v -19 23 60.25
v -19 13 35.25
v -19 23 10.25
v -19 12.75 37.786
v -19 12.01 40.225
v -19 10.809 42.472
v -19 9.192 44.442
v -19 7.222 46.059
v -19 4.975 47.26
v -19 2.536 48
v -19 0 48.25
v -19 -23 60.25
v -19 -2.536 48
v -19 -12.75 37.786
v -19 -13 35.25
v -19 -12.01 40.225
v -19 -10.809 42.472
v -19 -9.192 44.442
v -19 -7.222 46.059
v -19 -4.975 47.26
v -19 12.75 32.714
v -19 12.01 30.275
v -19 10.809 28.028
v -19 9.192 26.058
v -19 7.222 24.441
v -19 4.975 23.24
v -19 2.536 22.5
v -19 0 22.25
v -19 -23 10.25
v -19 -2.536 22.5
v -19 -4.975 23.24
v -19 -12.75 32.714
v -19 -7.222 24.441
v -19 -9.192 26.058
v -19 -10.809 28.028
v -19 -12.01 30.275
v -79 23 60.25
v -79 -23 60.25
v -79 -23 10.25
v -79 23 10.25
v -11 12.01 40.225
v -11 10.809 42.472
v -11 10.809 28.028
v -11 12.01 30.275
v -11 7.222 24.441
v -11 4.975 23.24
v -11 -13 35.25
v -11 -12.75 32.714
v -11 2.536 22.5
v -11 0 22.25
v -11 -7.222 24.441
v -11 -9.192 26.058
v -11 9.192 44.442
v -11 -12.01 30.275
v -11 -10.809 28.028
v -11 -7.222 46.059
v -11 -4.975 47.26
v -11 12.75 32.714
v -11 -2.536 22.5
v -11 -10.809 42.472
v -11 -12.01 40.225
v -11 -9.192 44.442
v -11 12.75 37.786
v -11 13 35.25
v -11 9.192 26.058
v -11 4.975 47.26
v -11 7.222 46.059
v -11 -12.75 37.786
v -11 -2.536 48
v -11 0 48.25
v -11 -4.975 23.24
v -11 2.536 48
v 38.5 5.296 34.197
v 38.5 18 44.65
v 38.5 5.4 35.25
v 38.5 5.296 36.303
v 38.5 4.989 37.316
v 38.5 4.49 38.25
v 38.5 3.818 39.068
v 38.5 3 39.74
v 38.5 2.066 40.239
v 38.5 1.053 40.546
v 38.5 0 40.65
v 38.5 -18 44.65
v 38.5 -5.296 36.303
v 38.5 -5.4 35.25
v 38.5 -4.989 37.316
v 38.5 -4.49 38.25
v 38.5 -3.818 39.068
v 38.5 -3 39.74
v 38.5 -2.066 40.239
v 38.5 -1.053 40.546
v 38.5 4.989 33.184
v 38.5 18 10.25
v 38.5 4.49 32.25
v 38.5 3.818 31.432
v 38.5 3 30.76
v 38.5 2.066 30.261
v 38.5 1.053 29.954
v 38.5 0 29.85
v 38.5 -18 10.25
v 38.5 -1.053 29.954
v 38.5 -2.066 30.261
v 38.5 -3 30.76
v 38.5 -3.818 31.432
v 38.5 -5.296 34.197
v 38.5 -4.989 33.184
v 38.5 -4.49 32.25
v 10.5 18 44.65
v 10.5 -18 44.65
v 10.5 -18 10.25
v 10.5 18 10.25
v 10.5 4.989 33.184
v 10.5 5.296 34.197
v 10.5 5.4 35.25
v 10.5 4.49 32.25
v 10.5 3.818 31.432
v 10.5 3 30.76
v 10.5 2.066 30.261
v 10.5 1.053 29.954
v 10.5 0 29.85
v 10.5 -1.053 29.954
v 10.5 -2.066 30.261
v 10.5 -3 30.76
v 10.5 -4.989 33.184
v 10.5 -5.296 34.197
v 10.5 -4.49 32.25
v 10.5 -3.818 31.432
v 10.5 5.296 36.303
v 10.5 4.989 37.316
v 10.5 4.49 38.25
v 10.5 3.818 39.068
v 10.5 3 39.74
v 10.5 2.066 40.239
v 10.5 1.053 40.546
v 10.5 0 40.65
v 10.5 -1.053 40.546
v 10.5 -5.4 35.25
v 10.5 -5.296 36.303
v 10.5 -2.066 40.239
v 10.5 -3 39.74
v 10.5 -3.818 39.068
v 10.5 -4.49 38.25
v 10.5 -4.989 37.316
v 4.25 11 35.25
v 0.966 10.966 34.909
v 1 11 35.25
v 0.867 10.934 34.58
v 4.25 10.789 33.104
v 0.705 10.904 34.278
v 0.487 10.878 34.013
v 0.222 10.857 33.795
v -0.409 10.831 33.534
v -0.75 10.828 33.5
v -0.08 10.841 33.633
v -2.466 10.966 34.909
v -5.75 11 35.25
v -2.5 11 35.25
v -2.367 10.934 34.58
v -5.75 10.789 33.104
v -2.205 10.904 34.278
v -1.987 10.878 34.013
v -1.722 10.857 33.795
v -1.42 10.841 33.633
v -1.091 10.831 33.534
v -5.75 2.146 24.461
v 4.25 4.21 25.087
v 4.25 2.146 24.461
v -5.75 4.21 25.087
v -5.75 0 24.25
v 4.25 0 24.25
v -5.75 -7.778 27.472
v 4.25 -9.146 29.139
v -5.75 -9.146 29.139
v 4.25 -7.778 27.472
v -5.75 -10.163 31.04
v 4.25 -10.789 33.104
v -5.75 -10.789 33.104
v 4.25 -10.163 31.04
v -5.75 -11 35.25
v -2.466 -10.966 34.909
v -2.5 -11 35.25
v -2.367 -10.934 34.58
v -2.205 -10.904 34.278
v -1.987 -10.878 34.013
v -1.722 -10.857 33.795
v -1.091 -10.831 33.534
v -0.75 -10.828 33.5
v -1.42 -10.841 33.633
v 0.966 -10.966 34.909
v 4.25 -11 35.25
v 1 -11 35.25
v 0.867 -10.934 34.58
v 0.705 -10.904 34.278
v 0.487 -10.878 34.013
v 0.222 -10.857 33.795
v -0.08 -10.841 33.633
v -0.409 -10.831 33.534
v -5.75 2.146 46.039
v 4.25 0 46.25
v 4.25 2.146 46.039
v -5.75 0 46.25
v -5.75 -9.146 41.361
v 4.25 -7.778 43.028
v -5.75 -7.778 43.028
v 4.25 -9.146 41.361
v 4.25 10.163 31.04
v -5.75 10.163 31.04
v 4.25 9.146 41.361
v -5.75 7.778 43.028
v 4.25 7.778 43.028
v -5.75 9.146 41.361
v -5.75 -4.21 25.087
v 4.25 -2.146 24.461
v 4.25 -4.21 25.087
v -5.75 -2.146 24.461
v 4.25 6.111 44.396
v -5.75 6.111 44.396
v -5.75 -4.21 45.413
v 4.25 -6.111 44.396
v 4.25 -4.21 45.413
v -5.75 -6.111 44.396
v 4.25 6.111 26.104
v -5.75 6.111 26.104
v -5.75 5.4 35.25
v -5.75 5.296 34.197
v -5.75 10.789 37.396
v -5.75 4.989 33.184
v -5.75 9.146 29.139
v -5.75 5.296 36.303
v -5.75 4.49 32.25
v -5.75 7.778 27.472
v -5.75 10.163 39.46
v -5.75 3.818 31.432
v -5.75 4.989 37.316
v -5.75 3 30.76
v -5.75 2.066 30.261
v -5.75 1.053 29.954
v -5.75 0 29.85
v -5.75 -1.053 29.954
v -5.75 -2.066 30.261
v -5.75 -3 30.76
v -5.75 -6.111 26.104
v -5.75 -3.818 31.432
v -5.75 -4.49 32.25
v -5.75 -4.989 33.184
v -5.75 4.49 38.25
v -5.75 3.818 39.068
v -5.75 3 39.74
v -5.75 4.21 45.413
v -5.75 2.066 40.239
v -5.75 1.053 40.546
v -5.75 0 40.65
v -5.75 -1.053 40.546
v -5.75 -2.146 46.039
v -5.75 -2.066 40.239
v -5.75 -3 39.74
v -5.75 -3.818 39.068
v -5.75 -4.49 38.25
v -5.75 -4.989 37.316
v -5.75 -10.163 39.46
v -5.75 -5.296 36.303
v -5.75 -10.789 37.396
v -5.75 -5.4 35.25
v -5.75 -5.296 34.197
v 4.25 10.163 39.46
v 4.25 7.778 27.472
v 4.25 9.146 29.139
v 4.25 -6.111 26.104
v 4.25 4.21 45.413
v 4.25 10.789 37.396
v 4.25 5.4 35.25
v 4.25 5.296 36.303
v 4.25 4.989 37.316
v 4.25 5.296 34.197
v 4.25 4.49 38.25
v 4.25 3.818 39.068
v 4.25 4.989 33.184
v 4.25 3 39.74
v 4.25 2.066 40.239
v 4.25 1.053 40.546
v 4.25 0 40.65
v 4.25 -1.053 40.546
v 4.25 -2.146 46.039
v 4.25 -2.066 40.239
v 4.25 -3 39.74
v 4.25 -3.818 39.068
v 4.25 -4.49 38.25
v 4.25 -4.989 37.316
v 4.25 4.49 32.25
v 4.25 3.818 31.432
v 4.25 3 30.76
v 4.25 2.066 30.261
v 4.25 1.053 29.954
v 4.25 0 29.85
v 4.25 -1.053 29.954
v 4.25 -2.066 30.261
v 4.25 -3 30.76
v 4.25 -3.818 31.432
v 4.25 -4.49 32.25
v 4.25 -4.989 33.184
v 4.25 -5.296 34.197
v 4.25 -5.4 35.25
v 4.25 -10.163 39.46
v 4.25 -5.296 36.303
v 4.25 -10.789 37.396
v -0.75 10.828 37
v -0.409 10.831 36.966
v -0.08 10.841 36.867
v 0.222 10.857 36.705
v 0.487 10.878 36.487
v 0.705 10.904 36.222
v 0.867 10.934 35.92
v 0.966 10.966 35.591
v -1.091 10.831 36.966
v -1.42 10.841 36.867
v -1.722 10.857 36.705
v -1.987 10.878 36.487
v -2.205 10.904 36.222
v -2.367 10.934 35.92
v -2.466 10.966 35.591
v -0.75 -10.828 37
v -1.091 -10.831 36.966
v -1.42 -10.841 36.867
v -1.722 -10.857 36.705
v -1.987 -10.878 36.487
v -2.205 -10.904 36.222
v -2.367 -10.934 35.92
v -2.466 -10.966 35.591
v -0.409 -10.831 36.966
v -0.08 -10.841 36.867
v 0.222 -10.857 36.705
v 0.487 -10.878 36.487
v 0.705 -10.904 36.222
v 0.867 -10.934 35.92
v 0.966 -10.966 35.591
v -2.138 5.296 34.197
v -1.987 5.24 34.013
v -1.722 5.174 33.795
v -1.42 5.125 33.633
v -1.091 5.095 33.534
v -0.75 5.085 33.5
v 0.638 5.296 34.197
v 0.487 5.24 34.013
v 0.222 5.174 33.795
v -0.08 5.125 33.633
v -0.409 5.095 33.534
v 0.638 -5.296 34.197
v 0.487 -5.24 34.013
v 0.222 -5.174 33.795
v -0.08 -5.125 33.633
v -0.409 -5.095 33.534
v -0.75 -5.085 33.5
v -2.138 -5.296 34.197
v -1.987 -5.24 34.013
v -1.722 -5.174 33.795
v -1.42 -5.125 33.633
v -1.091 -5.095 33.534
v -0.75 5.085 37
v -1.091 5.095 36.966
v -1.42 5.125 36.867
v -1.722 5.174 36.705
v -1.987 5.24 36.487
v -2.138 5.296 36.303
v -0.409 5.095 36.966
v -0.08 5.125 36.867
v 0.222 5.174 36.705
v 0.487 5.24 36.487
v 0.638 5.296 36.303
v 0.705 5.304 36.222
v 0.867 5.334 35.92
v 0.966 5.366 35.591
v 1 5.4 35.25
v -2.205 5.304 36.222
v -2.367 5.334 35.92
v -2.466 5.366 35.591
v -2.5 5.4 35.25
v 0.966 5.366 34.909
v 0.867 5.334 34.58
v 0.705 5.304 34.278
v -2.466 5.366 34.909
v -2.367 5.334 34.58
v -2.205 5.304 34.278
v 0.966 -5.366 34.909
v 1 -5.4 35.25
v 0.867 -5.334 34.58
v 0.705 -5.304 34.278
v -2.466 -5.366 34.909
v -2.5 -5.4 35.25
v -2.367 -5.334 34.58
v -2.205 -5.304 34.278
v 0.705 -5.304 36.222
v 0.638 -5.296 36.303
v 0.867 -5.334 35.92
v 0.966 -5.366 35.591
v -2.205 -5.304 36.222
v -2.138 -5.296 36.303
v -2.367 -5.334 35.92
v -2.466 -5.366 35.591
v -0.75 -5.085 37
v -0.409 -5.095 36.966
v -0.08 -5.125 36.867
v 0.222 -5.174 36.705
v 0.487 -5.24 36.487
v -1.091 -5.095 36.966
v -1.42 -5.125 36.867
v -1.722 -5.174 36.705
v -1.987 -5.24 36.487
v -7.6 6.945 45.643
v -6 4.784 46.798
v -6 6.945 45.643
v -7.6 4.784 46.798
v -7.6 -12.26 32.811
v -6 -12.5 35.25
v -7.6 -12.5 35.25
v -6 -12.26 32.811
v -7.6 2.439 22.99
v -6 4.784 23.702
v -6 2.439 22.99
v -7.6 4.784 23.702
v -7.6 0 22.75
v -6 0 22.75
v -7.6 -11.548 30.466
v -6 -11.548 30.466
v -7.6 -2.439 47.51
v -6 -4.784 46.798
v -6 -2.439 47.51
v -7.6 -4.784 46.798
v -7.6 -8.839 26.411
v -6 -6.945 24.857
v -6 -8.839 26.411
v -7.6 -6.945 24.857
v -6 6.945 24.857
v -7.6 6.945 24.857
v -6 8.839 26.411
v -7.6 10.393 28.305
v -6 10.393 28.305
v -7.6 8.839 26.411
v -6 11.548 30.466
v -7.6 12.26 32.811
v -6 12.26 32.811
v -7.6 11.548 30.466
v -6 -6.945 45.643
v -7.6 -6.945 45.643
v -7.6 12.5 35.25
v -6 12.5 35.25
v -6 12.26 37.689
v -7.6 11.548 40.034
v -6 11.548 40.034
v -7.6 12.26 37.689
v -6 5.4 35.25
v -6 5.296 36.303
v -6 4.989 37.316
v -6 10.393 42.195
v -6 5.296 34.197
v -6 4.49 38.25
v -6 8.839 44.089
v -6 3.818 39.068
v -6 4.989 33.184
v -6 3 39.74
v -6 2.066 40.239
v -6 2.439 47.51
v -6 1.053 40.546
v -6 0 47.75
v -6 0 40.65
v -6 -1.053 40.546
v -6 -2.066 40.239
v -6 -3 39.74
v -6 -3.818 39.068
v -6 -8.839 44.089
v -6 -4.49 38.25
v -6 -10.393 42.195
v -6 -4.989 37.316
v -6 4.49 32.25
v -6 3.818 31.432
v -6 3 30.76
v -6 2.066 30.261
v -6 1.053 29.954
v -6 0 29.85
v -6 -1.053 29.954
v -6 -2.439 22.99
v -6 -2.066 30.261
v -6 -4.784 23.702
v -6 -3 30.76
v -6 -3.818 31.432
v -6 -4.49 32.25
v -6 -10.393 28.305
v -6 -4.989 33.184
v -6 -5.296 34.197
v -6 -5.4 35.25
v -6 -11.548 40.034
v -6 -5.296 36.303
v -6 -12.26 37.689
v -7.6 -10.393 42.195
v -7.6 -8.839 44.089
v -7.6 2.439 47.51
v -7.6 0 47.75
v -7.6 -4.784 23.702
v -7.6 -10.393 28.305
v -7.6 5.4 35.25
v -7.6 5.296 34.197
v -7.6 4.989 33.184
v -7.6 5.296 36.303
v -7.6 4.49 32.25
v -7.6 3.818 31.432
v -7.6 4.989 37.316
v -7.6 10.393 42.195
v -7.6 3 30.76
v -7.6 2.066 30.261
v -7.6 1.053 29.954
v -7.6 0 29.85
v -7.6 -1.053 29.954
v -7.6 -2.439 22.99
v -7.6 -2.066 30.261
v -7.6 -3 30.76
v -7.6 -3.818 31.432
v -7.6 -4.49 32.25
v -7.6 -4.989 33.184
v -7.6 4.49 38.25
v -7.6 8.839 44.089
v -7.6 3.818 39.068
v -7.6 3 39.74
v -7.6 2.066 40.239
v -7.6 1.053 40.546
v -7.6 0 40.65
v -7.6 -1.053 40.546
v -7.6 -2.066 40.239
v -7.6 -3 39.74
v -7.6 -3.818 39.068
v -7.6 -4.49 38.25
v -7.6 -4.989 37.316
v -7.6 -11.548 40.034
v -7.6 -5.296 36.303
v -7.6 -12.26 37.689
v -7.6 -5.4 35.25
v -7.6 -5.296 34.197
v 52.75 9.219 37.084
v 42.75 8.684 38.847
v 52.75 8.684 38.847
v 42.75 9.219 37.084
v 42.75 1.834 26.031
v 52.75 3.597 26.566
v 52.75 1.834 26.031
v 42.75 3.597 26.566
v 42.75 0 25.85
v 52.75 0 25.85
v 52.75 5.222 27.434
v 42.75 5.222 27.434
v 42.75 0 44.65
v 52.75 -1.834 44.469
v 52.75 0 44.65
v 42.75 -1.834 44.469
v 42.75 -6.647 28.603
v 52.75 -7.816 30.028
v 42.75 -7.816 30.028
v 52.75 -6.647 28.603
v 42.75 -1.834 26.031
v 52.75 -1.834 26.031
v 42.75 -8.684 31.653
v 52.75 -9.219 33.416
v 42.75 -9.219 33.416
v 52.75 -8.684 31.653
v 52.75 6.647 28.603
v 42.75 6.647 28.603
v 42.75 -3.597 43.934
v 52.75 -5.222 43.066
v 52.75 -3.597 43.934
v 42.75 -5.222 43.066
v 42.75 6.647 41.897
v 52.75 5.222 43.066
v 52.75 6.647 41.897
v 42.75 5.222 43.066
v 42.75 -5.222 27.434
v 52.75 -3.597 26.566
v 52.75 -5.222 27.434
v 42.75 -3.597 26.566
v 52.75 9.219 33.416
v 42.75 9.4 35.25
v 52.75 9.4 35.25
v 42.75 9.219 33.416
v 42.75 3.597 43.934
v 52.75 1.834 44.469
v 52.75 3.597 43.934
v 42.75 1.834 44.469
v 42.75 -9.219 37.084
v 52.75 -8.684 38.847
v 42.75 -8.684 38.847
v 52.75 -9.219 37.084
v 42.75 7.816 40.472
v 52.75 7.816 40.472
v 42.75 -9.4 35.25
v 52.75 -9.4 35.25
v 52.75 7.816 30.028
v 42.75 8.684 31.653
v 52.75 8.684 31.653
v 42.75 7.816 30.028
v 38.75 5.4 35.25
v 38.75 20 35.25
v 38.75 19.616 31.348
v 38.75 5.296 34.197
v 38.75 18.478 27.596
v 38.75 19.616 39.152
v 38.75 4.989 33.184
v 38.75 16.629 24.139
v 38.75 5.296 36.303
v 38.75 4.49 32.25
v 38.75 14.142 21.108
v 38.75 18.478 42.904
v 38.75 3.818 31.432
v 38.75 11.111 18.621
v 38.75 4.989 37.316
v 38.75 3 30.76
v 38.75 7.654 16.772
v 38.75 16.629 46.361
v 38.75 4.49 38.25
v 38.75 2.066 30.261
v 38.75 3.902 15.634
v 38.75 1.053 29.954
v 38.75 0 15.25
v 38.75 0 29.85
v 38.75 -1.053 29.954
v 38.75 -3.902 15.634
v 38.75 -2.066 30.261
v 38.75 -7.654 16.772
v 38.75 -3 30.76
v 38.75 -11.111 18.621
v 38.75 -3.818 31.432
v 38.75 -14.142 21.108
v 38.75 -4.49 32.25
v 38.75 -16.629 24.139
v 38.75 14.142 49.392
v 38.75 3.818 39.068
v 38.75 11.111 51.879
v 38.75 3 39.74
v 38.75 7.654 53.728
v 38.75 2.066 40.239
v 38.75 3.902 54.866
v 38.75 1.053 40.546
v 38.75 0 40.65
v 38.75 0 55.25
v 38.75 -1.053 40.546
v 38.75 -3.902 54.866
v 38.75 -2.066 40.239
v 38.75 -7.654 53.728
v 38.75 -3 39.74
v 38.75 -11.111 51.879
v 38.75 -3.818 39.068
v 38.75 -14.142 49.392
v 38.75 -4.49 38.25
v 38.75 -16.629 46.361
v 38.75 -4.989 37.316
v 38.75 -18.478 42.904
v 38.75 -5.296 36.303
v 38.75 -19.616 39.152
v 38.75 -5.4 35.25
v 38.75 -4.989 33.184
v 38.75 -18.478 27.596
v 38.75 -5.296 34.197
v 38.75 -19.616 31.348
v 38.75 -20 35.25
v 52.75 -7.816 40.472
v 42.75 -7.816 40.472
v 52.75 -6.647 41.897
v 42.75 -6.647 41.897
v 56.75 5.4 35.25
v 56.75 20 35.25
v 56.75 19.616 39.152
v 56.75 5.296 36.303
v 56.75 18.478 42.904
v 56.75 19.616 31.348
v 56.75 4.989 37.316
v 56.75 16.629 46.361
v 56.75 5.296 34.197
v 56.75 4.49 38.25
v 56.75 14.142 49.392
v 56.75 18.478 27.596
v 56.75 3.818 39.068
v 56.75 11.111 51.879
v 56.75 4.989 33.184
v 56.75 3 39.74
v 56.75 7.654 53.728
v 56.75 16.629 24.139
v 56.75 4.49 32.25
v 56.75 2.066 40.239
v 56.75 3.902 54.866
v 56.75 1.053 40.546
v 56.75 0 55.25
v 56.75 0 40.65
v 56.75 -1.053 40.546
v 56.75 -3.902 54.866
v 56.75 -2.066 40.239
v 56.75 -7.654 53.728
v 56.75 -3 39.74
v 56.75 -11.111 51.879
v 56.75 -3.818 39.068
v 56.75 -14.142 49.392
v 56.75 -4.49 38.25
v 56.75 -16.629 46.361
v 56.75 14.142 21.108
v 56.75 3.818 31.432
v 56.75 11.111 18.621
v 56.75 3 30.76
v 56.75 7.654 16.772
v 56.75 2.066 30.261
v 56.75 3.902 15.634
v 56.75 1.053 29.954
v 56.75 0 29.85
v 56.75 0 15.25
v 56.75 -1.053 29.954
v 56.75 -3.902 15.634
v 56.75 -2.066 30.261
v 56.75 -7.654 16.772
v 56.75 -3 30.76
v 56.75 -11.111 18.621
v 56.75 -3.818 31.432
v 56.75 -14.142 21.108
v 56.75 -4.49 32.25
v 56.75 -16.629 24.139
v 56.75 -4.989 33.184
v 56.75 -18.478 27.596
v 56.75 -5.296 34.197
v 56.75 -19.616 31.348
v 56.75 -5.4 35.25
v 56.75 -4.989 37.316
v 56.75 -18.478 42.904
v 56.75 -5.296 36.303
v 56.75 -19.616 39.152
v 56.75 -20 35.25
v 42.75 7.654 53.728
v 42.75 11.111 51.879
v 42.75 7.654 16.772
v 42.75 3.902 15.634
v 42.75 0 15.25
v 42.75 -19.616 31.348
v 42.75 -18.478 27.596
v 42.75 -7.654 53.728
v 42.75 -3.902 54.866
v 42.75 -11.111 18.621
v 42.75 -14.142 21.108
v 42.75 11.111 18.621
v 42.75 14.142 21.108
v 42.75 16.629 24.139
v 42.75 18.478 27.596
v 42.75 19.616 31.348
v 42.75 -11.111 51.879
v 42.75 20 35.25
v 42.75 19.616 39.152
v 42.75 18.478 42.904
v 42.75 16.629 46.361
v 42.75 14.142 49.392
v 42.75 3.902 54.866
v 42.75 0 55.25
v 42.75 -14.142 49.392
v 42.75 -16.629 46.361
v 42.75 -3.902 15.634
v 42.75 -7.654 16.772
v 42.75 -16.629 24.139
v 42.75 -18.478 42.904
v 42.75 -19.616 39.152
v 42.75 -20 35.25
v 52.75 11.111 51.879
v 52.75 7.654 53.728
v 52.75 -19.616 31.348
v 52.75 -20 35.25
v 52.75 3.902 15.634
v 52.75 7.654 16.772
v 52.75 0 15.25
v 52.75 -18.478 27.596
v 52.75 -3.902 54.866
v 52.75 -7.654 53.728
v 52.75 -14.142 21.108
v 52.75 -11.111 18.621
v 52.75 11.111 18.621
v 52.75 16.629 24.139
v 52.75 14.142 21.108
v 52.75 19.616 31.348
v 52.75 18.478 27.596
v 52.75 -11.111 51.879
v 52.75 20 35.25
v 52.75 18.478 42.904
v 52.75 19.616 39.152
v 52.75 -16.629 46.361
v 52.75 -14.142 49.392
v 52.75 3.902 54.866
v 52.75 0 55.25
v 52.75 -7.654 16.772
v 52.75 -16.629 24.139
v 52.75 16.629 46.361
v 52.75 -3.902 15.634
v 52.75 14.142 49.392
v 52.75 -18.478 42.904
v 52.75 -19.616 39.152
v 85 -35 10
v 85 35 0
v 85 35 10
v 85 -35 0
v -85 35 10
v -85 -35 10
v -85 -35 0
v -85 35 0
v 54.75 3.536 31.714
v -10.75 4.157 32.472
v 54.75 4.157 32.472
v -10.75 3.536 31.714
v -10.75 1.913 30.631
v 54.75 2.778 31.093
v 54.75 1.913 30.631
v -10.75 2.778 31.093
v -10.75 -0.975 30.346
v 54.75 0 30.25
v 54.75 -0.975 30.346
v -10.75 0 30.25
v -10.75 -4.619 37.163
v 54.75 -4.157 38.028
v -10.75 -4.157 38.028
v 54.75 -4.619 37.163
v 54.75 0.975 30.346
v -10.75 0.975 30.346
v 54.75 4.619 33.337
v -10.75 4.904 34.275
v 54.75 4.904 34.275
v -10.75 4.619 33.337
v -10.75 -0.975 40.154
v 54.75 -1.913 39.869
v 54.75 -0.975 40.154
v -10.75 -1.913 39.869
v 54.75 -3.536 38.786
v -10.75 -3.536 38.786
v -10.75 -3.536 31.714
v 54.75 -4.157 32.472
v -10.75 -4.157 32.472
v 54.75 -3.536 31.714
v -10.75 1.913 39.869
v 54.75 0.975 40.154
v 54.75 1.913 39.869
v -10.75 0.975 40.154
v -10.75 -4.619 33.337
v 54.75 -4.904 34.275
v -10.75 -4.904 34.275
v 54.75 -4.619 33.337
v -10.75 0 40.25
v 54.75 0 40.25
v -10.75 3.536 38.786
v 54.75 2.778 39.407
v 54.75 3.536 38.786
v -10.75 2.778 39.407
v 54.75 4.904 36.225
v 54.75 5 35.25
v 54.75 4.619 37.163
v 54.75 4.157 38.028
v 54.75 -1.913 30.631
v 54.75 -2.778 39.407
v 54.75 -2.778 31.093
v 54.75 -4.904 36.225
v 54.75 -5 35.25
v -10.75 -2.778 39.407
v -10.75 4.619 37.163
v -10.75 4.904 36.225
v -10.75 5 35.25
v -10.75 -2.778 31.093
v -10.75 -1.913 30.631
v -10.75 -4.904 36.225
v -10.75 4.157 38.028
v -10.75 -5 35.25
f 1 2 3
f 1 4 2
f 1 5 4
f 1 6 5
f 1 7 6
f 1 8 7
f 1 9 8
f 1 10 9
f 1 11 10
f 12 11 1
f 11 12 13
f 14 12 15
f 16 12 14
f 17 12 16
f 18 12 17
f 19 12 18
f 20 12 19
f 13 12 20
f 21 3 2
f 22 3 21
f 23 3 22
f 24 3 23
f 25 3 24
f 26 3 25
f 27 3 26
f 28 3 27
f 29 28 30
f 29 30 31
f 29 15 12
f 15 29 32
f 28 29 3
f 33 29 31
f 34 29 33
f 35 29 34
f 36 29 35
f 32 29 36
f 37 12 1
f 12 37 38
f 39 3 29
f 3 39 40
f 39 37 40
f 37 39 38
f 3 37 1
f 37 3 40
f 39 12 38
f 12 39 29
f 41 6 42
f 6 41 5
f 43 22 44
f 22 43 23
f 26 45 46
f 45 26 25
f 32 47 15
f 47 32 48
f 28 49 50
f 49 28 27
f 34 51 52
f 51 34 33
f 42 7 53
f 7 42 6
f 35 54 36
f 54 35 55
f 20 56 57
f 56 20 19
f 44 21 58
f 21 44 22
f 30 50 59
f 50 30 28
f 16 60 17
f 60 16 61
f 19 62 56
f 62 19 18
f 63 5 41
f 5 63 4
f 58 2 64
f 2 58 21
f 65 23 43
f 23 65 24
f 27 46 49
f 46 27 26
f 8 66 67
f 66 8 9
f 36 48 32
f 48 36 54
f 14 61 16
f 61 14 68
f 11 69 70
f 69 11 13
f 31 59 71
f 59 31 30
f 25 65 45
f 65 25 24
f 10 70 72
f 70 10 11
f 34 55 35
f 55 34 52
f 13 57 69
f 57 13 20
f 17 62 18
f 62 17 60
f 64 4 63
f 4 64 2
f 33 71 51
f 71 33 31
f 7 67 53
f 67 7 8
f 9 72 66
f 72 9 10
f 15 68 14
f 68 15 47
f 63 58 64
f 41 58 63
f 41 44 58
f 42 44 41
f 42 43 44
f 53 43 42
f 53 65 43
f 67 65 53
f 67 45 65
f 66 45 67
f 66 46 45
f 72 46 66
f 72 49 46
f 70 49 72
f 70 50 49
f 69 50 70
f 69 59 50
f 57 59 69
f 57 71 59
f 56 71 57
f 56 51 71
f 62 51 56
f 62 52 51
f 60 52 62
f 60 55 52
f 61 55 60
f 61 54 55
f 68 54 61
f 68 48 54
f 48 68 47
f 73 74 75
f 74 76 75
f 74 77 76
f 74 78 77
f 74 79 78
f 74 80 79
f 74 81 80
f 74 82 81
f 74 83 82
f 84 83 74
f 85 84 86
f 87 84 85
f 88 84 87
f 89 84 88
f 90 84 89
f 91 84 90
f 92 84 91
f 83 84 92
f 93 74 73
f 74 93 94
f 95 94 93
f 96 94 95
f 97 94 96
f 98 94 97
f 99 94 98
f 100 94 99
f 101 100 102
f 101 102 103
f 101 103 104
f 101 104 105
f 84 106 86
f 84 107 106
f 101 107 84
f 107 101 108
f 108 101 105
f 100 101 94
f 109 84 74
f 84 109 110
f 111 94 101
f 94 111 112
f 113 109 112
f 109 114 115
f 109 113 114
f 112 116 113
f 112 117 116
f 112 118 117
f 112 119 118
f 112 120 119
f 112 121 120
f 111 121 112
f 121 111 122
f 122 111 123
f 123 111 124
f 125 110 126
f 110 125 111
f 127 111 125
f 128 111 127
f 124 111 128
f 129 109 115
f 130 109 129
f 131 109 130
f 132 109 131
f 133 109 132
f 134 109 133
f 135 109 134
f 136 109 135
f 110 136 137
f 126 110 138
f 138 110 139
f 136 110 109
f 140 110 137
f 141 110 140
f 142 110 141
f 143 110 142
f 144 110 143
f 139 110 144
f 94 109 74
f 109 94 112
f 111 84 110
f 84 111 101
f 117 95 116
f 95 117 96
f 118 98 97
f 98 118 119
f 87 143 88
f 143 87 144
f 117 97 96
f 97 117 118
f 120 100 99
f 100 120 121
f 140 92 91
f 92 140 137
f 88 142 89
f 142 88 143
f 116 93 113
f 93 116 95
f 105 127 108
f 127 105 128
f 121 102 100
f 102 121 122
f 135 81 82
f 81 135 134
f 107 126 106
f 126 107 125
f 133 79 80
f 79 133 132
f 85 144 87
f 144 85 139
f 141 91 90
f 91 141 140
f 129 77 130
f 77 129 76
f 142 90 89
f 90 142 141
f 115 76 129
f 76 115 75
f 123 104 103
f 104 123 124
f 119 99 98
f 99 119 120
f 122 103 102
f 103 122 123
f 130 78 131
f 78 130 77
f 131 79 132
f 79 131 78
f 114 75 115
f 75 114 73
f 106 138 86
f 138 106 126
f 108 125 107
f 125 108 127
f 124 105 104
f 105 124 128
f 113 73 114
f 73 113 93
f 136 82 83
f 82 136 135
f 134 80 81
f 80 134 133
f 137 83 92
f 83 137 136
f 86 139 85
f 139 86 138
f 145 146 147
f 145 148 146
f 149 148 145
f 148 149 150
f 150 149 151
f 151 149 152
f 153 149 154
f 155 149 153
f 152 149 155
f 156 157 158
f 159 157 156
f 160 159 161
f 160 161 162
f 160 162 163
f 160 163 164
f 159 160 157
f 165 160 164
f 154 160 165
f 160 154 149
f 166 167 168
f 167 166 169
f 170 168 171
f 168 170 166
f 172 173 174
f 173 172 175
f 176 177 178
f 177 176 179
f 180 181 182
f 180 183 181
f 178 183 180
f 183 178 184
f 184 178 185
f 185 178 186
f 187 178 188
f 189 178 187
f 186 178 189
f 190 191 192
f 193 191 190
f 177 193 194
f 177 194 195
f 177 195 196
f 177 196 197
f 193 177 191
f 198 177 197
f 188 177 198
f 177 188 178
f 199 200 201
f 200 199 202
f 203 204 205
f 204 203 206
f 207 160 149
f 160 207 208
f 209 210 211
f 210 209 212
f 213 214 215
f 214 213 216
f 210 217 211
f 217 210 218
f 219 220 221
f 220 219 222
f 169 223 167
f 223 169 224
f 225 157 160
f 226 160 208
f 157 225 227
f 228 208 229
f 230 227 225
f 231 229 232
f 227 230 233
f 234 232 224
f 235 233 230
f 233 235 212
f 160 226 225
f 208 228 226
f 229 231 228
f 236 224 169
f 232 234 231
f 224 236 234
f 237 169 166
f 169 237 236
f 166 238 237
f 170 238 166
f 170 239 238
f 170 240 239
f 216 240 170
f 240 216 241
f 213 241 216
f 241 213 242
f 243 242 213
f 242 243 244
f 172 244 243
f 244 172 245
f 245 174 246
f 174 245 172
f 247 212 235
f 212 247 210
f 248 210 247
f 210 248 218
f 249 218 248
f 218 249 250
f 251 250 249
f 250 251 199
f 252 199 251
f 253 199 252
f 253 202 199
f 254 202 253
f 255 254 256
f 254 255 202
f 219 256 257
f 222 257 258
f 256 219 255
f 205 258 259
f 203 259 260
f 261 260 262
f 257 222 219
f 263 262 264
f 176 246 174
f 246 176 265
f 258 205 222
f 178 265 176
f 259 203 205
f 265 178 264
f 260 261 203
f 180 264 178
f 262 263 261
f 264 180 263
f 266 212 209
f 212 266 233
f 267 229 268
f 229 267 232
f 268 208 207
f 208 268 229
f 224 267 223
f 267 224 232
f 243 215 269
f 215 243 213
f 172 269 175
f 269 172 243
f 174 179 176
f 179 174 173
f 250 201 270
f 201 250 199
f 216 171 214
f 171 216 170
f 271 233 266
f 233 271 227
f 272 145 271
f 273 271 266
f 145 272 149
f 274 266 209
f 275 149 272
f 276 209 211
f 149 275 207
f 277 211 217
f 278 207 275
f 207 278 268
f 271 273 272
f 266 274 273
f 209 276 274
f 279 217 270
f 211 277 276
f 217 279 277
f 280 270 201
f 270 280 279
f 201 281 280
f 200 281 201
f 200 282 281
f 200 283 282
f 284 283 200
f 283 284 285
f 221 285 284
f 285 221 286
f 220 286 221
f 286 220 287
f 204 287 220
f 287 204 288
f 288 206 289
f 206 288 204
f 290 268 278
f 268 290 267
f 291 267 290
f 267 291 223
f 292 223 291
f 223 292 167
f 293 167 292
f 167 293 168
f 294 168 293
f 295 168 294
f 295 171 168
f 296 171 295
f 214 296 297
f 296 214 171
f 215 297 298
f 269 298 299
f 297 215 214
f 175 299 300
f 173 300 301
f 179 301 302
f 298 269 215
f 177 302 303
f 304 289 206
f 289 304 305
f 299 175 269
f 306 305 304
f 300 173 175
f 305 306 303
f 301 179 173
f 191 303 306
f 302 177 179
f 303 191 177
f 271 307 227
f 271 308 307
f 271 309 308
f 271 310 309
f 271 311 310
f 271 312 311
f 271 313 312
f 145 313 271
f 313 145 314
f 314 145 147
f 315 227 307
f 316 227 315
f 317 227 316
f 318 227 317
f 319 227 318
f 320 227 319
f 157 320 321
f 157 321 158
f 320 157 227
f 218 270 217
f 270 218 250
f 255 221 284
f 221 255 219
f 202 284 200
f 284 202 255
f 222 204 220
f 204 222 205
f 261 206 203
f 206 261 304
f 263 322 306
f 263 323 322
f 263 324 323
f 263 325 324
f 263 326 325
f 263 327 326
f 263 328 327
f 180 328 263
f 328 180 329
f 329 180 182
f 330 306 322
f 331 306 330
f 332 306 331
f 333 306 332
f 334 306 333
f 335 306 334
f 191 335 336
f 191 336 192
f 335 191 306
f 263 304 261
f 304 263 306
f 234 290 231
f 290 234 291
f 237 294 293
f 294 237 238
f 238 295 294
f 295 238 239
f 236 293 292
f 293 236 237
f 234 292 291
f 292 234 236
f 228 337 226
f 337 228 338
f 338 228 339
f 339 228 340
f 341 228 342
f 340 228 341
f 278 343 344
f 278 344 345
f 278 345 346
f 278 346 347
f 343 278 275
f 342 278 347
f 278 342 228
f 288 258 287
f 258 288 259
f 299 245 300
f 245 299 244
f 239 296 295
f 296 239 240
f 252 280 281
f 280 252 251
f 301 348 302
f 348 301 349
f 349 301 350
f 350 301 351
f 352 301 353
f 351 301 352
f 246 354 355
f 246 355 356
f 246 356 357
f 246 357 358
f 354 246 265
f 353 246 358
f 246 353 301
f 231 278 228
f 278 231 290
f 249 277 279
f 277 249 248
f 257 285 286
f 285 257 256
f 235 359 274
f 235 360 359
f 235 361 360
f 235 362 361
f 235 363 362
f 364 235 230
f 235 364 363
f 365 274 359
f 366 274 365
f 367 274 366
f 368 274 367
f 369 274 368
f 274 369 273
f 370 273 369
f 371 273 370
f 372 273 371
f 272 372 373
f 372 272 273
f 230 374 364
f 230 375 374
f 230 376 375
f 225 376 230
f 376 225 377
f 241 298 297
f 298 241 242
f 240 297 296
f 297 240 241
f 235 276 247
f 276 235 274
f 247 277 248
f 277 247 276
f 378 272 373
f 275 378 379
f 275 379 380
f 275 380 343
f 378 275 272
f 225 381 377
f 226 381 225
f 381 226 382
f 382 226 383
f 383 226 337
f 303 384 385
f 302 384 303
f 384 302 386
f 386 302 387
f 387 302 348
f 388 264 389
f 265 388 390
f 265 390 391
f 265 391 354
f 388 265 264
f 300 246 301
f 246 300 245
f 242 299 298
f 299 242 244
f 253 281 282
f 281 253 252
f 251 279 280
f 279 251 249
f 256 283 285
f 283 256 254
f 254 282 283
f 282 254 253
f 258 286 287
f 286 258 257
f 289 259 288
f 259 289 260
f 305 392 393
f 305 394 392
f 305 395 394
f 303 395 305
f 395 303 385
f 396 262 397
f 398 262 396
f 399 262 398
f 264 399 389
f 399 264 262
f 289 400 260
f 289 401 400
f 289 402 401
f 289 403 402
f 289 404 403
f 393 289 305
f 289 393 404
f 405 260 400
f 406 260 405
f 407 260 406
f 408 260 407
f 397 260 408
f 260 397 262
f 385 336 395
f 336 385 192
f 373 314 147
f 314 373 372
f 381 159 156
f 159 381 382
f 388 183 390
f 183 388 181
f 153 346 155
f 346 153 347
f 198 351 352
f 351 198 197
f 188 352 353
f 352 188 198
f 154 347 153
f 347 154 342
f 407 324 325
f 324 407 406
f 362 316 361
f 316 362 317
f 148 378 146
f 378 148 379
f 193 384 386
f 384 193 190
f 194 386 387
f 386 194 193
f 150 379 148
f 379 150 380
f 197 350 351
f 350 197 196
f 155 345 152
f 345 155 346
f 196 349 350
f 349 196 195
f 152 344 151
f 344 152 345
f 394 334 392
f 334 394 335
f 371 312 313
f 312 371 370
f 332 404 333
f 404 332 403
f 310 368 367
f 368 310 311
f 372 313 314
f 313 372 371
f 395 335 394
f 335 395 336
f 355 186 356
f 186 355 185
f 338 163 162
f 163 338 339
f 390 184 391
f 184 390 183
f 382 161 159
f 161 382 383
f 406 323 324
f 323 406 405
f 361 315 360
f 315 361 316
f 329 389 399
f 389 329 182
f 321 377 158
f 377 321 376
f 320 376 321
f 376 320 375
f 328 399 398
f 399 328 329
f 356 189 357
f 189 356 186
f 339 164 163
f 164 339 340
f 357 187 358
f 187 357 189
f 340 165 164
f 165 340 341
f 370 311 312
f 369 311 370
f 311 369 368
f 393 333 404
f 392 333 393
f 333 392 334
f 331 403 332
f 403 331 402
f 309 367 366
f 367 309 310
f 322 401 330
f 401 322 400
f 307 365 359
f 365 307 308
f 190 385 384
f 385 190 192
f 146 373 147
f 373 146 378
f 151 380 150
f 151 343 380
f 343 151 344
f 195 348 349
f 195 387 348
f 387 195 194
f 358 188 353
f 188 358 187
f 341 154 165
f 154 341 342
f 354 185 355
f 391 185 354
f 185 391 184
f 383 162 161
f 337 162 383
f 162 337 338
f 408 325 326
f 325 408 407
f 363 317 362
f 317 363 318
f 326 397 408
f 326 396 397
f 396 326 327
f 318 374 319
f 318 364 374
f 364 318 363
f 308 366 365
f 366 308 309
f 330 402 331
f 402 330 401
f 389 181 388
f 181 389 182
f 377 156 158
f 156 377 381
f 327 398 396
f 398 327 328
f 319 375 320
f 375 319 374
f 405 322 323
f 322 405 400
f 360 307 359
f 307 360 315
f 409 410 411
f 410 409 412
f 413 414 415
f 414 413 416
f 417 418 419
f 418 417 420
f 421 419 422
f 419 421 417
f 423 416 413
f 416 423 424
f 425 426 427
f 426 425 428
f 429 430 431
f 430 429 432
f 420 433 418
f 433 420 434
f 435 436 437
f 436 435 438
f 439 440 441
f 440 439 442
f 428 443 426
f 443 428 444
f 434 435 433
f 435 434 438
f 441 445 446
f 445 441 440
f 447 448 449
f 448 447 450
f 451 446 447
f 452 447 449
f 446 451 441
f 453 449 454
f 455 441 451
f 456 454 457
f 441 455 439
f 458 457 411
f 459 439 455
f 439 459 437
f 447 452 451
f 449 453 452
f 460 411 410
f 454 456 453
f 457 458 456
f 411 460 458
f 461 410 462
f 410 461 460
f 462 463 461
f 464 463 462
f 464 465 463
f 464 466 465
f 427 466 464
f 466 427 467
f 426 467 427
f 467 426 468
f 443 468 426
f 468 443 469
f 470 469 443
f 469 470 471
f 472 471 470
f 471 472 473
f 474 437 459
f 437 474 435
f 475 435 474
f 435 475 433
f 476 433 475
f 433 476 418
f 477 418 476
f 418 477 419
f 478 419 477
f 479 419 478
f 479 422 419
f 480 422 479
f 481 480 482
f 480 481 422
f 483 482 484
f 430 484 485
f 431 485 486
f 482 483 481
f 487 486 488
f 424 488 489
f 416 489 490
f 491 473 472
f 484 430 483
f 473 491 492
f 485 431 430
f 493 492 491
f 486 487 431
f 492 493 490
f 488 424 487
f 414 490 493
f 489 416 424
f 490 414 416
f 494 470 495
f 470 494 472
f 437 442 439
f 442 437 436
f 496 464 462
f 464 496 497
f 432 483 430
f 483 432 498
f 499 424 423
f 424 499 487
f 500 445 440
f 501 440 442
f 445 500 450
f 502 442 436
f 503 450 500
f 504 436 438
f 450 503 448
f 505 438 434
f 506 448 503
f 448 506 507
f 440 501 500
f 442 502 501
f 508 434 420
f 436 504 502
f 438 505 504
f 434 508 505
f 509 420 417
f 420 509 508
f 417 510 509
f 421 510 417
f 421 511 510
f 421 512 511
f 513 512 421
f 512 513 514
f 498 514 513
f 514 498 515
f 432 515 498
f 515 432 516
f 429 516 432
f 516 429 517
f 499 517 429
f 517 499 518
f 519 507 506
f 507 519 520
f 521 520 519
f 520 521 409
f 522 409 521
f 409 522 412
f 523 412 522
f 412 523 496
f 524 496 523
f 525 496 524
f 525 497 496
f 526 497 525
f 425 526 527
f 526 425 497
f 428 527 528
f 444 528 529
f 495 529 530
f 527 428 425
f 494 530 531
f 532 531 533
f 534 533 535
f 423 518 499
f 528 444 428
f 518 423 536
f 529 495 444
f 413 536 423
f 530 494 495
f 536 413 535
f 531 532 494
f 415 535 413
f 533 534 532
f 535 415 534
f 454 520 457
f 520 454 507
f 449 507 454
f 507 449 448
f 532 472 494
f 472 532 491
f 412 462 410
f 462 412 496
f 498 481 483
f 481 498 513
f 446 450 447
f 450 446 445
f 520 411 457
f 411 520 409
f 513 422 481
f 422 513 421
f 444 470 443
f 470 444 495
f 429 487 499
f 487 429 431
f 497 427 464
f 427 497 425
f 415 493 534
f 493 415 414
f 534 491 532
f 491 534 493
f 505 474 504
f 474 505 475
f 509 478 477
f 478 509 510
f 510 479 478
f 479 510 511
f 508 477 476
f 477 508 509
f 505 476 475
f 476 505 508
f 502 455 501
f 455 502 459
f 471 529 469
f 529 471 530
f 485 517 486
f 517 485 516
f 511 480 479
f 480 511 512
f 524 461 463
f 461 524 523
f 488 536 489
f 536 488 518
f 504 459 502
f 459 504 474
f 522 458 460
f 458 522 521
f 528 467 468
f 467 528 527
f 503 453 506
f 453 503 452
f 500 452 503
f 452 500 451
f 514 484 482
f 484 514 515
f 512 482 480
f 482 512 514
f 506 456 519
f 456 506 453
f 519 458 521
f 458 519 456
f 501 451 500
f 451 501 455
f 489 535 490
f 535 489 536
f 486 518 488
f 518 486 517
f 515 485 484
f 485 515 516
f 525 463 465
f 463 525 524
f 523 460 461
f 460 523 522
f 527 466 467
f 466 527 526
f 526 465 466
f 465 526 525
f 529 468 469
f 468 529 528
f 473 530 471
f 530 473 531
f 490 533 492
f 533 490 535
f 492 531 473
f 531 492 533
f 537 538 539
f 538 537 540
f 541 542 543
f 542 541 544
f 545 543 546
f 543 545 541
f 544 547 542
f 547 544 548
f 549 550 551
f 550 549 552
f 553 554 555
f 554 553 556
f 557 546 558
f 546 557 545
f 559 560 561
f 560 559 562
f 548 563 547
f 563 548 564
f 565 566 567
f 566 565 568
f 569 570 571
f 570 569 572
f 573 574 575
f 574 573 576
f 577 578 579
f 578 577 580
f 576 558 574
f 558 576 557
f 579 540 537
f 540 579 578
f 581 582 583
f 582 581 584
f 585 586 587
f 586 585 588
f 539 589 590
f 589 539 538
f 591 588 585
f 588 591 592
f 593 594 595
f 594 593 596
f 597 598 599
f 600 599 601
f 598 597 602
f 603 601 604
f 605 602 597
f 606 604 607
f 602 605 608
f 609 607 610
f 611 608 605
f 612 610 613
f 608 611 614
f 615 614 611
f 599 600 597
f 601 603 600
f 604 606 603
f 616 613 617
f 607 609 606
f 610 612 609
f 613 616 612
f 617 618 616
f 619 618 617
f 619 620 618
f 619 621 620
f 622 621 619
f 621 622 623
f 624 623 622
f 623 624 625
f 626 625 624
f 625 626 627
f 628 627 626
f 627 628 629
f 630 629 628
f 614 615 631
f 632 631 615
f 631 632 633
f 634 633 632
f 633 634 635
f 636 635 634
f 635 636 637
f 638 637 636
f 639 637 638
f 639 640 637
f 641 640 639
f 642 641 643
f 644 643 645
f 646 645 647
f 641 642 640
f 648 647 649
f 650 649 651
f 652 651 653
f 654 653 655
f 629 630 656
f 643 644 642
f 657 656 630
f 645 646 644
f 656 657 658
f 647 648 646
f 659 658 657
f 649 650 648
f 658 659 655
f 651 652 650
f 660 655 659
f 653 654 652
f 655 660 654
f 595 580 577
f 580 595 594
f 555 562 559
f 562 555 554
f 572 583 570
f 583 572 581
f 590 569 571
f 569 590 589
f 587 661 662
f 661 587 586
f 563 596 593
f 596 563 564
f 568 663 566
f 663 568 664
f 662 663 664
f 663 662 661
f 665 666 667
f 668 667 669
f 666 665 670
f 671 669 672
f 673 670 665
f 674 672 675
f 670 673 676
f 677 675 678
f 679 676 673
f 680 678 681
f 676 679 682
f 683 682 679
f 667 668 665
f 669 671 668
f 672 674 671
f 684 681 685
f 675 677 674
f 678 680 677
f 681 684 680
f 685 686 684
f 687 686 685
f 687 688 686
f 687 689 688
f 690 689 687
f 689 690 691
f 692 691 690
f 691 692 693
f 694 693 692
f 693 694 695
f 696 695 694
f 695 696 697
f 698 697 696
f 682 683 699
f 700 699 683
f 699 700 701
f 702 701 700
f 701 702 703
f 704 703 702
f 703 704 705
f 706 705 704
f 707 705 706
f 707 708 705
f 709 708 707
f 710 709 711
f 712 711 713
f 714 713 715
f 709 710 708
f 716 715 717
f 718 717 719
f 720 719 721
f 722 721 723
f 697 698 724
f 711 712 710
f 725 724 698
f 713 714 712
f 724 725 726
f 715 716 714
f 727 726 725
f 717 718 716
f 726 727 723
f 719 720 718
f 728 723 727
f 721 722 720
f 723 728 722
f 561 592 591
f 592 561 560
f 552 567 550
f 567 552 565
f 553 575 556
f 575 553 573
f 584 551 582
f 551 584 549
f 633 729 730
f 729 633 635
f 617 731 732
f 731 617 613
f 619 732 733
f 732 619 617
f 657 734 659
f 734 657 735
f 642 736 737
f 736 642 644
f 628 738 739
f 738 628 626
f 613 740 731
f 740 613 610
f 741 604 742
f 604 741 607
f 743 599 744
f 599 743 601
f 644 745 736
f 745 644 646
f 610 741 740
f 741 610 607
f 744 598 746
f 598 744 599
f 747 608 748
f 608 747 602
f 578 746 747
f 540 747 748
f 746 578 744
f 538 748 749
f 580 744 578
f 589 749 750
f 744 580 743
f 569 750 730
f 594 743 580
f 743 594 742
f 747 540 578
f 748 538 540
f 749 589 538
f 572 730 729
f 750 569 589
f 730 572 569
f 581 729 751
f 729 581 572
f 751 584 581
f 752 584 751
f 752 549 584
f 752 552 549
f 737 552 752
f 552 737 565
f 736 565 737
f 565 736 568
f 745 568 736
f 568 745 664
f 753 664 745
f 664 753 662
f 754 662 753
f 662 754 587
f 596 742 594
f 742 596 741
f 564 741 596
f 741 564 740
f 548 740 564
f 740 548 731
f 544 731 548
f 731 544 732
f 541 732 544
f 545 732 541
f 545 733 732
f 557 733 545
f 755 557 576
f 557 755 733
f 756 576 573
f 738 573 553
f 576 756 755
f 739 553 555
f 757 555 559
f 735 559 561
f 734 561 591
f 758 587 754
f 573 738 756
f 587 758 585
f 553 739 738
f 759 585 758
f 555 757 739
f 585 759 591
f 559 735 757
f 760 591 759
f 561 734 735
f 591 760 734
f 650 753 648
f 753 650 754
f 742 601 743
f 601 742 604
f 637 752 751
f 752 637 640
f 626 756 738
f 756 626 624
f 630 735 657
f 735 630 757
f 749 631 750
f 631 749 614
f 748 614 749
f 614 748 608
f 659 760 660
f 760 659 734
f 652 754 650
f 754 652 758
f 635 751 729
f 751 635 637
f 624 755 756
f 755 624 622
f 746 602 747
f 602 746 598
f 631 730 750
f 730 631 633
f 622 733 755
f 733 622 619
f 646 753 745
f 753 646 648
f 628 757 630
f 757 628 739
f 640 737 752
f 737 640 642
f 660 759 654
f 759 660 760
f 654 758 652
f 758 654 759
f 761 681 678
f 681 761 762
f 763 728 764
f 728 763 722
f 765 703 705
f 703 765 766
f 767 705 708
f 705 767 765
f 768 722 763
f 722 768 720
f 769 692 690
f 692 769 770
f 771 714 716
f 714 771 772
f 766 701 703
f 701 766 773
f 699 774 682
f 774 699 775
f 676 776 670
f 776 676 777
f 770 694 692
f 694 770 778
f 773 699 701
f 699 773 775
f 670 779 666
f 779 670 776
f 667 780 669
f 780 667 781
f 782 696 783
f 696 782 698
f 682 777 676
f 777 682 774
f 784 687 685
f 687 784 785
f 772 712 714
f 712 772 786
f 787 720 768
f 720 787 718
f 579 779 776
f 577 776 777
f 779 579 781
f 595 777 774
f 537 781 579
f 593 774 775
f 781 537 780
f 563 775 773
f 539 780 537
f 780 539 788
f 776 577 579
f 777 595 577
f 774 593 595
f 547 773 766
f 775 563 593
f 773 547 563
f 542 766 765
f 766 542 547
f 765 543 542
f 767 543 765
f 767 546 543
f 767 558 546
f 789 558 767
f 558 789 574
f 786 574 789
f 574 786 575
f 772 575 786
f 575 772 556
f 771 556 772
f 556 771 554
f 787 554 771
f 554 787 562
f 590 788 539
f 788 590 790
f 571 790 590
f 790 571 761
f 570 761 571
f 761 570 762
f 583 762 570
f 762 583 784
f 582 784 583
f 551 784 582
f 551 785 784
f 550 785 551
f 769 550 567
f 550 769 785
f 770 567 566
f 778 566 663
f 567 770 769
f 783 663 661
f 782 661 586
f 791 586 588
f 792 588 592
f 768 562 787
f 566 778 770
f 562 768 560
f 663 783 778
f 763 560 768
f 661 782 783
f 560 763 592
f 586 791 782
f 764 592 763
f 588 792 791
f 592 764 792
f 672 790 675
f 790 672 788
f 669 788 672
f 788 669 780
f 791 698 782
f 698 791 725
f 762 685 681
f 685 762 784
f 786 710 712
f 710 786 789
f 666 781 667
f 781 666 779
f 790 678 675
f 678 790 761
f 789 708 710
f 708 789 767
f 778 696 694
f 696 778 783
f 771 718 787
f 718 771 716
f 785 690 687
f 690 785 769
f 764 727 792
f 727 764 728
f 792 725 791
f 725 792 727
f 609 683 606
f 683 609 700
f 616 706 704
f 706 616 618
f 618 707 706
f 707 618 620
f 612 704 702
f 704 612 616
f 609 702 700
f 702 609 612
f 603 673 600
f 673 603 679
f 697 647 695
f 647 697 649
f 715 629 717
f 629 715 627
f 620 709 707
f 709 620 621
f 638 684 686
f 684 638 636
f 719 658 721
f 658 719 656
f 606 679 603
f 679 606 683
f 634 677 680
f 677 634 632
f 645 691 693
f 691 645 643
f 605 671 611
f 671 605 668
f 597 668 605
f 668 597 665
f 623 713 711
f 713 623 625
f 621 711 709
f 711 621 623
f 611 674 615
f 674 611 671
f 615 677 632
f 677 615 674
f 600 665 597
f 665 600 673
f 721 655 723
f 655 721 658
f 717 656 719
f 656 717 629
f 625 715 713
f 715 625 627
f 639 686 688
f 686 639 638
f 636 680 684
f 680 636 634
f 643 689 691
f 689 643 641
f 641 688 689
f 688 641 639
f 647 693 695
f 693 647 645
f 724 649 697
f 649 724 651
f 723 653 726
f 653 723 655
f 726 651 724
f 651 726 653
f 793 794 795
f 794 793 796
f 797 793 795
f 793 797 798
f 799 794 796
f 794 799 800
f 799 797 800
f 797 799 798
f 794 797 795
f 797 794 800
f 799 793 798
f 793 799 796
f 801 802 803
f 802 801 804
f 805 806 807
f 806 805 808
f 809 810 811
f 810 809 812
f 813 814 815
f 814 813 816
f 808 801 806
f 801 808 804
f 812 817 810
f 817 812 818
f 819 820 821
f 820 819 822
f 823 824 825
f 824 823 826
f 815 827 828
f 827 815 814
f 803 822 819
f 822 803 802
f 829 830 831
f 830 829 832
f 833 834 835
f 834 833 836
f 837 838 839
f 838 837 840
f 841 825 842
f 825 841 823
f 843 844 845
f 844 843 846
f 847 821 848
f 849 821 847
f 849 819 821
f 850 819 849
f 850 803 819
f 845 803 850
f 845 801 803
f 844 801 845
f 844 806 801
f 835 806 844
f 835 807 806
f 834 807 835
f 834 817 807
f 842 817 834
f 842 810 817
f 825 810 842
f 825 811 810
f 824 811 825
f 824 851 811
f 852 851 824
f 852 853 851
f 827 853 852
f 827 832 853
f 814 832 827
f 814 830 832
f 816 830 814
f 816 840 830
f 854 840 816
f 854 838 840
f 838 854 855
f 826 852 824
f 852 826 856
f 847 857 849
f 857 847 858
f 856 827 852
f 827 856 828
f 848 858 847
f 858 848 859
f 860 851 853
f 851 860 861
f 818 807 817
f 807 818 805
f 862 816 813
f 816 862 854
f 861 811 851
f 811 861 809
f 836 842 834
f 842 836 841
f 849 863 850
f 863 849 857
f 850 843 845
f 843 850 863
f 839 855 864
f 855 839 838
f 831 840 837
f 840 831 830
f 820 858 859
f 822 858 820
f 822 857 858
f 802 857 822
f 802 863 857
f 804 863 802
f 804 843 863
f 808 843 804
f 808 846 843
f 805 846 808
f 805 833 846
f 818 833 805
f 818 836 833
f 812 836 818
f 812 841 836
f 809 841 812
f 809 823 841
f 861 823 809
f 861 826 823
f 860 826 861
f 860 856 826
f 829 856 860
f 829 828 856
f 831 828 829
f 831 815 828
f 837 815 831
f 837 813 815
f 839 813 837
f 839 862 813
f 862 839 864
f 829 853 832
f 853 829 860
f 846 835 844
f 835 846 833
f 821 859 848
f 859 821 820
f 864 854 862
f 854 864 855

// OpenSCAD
$fn = 32;

// ------------------------------------------------------------------------
// Motor drive station: motor 60 x 50 mm, shaft d10, pulley d40
// Every part is its own module, assembly() places every instance.
// ------------------------------------------------------------------------

// --- part 1 ---
module station_bed() {
  difference() {
    translate([-85, -35, 0]) cube([170, 70, 10]);
  }
}

// --- part 2 ---
module drive_motor() {
  union() {
    translate([-30, -23, 0]) cube([60, 46, 50]);
    translate([34, 0, 25]) rotate([0, 90, 0]) cylinder(h = 8, d = 26, center = true);
  }
}

// --- part 3 ---
module pillow_block() {
  difference() {
    translate([-14, -18, 0]) cube([28, 36, 34.4]);
    translate([0, 0, 25]) rotate([0, 90, 0]) cylinder(h = 30, d = 10.8, center = true);
  }
}

// --- part 4 ---
module drive_shaft() {
  translate([0, 0, -32.75]) cylinder(h = 65.5, d = 10);
}

// --- part 5 ---
module shaft_collar() {
  difference() {
    cylinder(h = 10, d = 22);
    translate([0, 0, -1]) cylinder(h = 12, d = 10.8);
    translate([0, 0, 5]) rotate([90, 0, 0]) cylinder(h = 24, d = 3.5, center = true);
  }
}

// --- part 6 ---
module collar_washer() {
  difference() {
      translate([0, 0, 0]) cylinder(h = 1.6, d = 25);
      translate([0, 0, -1]) cylinder(h = 3.6, d = 10.8);
    }
}

// --- part 7 ---
module drive_pulley() {
  difference() {
    union() {
      cylinder(h = 18, d = 18.8);
      cylinder(h = 4, d = 40);
      translate([0, 0, 14]) cylinder(h = 4, d = 40);
    }
    translate([0, 0, -1]) cylinder(h = 20, d = 10.8);
  }
}

// --- assembly ---
module assembly() {
  color([0.80, 0.24, 0.20]) translate([0, 0, 0]) rotate([0, 0, 0]) station_bed();
  color([0.20, 0.45, 0.75]) translate([-49, 0, 10.25]) rotate([0, 0, 0]) drive_motor();
  color([0.25, 0.62, 0.32]) translate([24.5, 0, 10.25]) rotate([0, 0, 0]) pillow_block();
  color([0.92, 0.70, 0.18]) translate([22, 0, 35.25]) rotate([0, 90, 0]) drive_shaft();
  color([0.58, 0.35, 0.70]) translate([-5.75, 0, 35.25]) rotate([0, 90, 0]) shaft_collar();
  color([0.16, 0.66, 0.66]) translate([-7.6, 0, 35.25]) rotate([0, 90, 0]) collar_washer();
  color([0.85, 0.48, 0.18]) translate([38.75, 0, 35.25]) rotate([0, 90, 0]) drive_pulley();
}

assembly();
